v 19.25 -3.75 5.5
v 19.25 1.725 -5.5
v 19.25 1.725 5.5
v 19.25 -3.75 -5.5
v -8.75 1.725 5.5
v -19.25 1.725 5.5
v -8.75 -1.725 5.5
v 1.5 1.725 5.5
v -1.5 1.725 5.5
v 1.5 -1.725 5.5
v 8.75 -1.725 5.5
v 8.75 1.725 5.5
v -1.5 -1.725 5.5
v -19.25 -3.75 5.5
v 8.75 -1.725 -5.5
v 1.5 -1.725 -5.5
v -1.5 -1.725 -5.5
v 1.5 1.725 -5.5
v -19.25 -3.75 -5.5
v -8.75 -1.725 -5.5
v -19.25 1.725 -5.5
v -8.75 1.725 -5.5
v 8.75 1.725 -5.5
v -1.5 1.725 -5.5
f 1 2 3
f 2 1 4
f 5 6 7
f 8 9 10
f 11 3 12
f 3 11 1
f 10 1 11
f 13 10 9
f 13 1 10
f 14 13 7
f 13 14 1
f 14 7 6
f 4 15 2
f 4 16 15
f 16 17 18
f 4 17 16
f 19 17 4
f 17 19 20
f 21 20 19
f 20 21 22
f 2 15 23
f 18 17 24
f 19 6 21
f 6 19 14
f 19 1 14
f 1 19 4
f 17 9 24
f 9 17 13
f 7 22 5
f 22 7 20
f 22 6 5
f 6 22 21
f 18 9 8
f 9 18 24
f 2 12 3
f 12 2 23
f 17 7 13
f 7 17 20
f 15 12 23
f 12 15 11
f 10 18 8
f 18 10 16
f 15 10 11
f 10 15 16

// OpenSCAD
// file: myTools.scad
module tube (r = 0, d = 0, l = 0, 
            thick = 0, 
            bCentered = true, 
            taper_pct = 0, 
            circlip = false) // r=radius d=dia l=length 
{
    assert( r != 0 || d != 0, "specify one of radius or diameter");
    assert( l != 0 , "tube: need length 'l' to be non zero");
    assert( thick != 0, "wall thickness cannot be zero");

    punch = $preview ? .2 : 0; // stop funny view artifact

    dia = r ? r * 2 : d;

    od = ((thick > 0) ? dia + thick * 2 : dia);
    id = (thick > 0) ? dia             : dia  + thick *2; 

    
    
    if (thick > 0)
        echo ("tube\tMIN id = ", id, "od = ", od, "wall = ", thick, "center= ", bCentered);
    else
        echo ("tube\tMAX od = ", od, "id = ", id, "wall = ", thick, "center= ", bCentered);

    echo ("tube\tHeigth = ", l);
        
    if (taper_pct != 0)
    {
        echo ("tube\t*** OD expanded by ", taper_pct, "%, : bottom od = ", od * (1. +taper_pct/100), "top od = ", od);
    }
    
    assert(dia || dia < 0, "tube : missing r or d ");
    
    // if taper_pct specified, the base will always be closest to 0,0,0
    translate([ 0, 0, taper_pct == 0 ? 0: bCentered ? l/2:l  ])
    rotate([0, taper_pct == 0 ? 0 : 180, 0 ])

    difference()
    {
        // make a reese's cup
        {
            color("YELLOW", .3)
            linear_extrude(height= l, scale = 1 + taper_pct/100)
                difference()
                {
                    circle(d = od);
                    circle(d = .5);
                }
        }
    
     // hollow out reessed cup
     color("GREEN")
     translate([0, 0, -punch/2])
     linear_extrude(height= l+ punch*2, $fn=100)
     {
        circle(d = id);
        if (circlip) #square([1 + punch, od ]);
     }
    
    }
}
//==============================================================================
        
module abox (dims, 
            thick = 0, 
            bCentered = true, 
            round_out = 0, 
            round_in = 0, 
            bSolid = false,
            bHollow = false,
            elevator = 0)   // move bottom up by X
{
    punch = $preview ? .1 : 0; // stop funny view artifact
    
    assert(thick != 0, "Thick must be specified. +=outside dim, -= inside dims");
    assert(dims.z > thick, "wall thickness too large for depth of box");

    wall2 = abs(thick) * 2; // 2 walls in each direction
    wall = wall2 / 2;
    
    // box either grows inward (thick < 0) or outward (thick > 0)  from dims
    fat = dims + [ wall2, wall2, wall];
    thin = dims - [ wall2, wall2, wall];
    
    offset = (thick > 0 && bCentered == false) ? wall : 0;
    
    //echo ("abox : adjusting x,y,z by ", offset, " to move origin from  center to 0,0,0");
    translate( [ bCentered ? 0 : dims.x /2 + offset, bCentered ? 0 : dims.y /2 + offset, bCentered ? 0 : dims.z /2 + offset/2]) 
    {
        if (thick > 0)
        {   
            // wall grows outwards from users dim
            echo ("making a box, MAX INSIDE dim = ", dims);
            echo ("   wall=", thick, " mm");
            echo ("   calc outside = ", fat, " mm");
        }
        else
        {
            // wall grows inward from users dime
            echo ("making a box, MAX OUTSIDE dim = ", dims);
            echo ("    wall=", thick, "mm");
            echo ("    calc inside = ", thin, " mm");
        }
        echo (" ");
        
        // linear extrude alway works in the positive x/y plane an goes upward.
        // after calc, re-center about 0,0,0 where a bCentered cube would be
        
        translate([ 0, 0, thick > 0  ? -fat.z/2 : -dims.z/2 ])
        difference()
        {
            echo ("round_out = ", round_out);

            // MAKE SOLID BOX --------------------------------------
            router_outside = round_out ? round_out : 0;
            x = thick > 0  ? fat.x - router_outside : dims.x - router_outside;
            y = thick > 0  ? fat.y - router_outside : dims.y - router_outside;


            // MAKE PUCHNED INSIDE
            // using 'offset' it will add r on all dimensions, then round., 
            // so now you have fatter perimeter than you started with :(
            //  but at least the corners are round.
            
            // Compensate by shrinking dimension by r, 
            // and then by calling offset, offset will then add it back

            //color("YELLOW", .2)

            // ready height 
            linear_extrude(thick > 0  ? fat.z : dims.z)
            if (round_out)
            {
                offset( r= round_out, $fn=30)
                square( [x - router_outside, y - router_outside], true);
            }
            else
            {
                // no rounding on outside dims.
                square( [x, y], true);
            }
            // time to punch out the inside if requested.
            if (bSolid == false)
            {
                hollow_offset = bHollow ? fat.z/2 + .2  : dims.z/2 +.2;
                // punching out inside. its either dims or thin.
                router_inside = round_in;
                echo ("round_in = ", router_inside);
                xi = thick > 0  ? dims.x  : thin.x;
                yi = thick > 0  ? dims.y : thin.y ;

                color("GREEN")

                // move 'punch' up if you need a bottom else zero (hollowed out)

                translate([ 0,0, bHollow ? -.1 : wall + elevator]) 
                linear_extrude(thick > 0  ? fat.z - wall  + hollow_offset : dims.z - wall + hollow_offset)
                //#linear_extrude(fat.z - wall  + hollow_offset)
                
                if (round_in) 
                {
                    offset( r= round_in, $fn=30)
                    square( [ xi - round_in*2, yi - round_in*2], true);
                }
                else
                    square( [ xi, yi], true);
            }
        }
    }
 }
//-----------------------------------------------------
module abox_punch (dims, 
            thick = 0, 
            bCentered = true, 
            round_out = 0, 
            round_in = 0, 
            bSolid = false,
            bHollow = false,
            elevator = 0)   // move bottom up by X
{
    // move bottom down by wall thickness to blow out bottom
    abox(dims, thick, bCentered,
         round_out, round_in, bSolid = false, 
         bHollow=true, elevator = -thick);
}



// 50x25x10 box walls grow inward (-2). on center origin midpoint
// rounded outside (default), sharp corner inside(default), bCentered about 0,0,0
//color("GREEN", .9)
//abox([50,25, 10], -2, true); 


// 50x25x10 box walls grow outward (+2). on center origin midpoint
// sharp outside corners, rounded inside corners. Sit on x,y plane
color("BLUE", .9)
abox([50,20, 10], +2, round_in=2, bCentered = false);  // 50x25x10 box inside dim origin has 0,0


// 50x25x10 box walls grow inward (-2). on center origin midpoint
// sharp corners inside and out. sits on x,y plane
color("GREY", .9)//
translate([ 55, 0, 0])      
abox([50,20, 10], +2, round_out=3, false);

color("PINK", .9)//
translate([ 55 * 2, 0, 0])      
abox_punch([50,20, 10], +2, round_out=3, false);

color("GREEN", .9)//
translate([ 55 * 3, 0, 0])      
abox_punch([50,20, 10], +2, round_in=2, false);


color("CYAN", .9)//
translate([ 55 * 4, 0, 0])      
abox_punch([50,20, 10], +2, round_in=2, round_out=2, false);


/*
color("GREEN", .9)//
translate([ 140, 10, -10])      
abox([86.66, 56.865, 5], 3, bHollow = true, bCentered = false); 
*/

/*
// 50x25x10 box walls grow inward (-2). on center origin midpoint
// round corners outside and SOLID
color("BLUE", .9)//
translate([ 55, 0, 0])      
abox([50,25, 10], +2, round_out=2, round_in=0, false, bSolid = true); // 50x25x10 box outside dim origin is 0,0
*/

//translate ([-30,-30, 0])
{
/*
    // tube outer dia  20, inner dia = (20 - 8)
    color("PINK")
    tube (d = 20, l = 20, thick = -8, bCentered = false);

    // tube, inner dia = (2* 10), outer dia = ((2*10) + 2) 
    color("PURPLE", .3)
    tube (r = 10, l = 20, thick = +2, bCentered= true);
*/
/*
    tube (d = 60, l = 20, thick = -6, bCentered = false);

    translate([0, 0, 50])
    tube (d = 60, l = 20, thick = -6, bCentered = false, taper_pct = 20, circlip = true);
    //color("GREEN")
    //tube (d = 20, l = 20, thick = -2, bCentered = false, taper = 10, circlip = true);
*/

}
// main file
use <myTools.scad>
$fn=100;


WIRE_PAIR= [ 7.25, 3.75, 12.0 ];
//SQUEEZE = [ 1.5, 1, 0];
SQUEEZE = [ 0, .3, 0];
REAL_PAIR = WIRE_PAIR - SQUEEZE;
MIDDLE=3;

OUTSIDE=[WIRE_PAIR.x * 2 + MIDDLE *8 ,
        WIRE_PAIR.y * 2, 
        WIRE_PAIR.z -1];
        
difference()
{
    cube (OUTSIDE, true);
    
    
    translate([ -MIDDLE/2 - REAL_PAIR.x/2, 0,0])
    #cube (REAL_PAIR, true);
    
    translate([ +MIDDLE/2 + REAL_PAIR.x/2, 0,0])
    #cube (REAL_PAIR, true);
    
    translate([ 0, WIRE_PAIR.y + REAL_PAIR.y/2 ,0])
    #cube ([WIRE_PAIR.x * 2 + MIDDLE *8 , WIRE_PAIR.y * 2, WIRE_PAIR.z -1], true);
}
